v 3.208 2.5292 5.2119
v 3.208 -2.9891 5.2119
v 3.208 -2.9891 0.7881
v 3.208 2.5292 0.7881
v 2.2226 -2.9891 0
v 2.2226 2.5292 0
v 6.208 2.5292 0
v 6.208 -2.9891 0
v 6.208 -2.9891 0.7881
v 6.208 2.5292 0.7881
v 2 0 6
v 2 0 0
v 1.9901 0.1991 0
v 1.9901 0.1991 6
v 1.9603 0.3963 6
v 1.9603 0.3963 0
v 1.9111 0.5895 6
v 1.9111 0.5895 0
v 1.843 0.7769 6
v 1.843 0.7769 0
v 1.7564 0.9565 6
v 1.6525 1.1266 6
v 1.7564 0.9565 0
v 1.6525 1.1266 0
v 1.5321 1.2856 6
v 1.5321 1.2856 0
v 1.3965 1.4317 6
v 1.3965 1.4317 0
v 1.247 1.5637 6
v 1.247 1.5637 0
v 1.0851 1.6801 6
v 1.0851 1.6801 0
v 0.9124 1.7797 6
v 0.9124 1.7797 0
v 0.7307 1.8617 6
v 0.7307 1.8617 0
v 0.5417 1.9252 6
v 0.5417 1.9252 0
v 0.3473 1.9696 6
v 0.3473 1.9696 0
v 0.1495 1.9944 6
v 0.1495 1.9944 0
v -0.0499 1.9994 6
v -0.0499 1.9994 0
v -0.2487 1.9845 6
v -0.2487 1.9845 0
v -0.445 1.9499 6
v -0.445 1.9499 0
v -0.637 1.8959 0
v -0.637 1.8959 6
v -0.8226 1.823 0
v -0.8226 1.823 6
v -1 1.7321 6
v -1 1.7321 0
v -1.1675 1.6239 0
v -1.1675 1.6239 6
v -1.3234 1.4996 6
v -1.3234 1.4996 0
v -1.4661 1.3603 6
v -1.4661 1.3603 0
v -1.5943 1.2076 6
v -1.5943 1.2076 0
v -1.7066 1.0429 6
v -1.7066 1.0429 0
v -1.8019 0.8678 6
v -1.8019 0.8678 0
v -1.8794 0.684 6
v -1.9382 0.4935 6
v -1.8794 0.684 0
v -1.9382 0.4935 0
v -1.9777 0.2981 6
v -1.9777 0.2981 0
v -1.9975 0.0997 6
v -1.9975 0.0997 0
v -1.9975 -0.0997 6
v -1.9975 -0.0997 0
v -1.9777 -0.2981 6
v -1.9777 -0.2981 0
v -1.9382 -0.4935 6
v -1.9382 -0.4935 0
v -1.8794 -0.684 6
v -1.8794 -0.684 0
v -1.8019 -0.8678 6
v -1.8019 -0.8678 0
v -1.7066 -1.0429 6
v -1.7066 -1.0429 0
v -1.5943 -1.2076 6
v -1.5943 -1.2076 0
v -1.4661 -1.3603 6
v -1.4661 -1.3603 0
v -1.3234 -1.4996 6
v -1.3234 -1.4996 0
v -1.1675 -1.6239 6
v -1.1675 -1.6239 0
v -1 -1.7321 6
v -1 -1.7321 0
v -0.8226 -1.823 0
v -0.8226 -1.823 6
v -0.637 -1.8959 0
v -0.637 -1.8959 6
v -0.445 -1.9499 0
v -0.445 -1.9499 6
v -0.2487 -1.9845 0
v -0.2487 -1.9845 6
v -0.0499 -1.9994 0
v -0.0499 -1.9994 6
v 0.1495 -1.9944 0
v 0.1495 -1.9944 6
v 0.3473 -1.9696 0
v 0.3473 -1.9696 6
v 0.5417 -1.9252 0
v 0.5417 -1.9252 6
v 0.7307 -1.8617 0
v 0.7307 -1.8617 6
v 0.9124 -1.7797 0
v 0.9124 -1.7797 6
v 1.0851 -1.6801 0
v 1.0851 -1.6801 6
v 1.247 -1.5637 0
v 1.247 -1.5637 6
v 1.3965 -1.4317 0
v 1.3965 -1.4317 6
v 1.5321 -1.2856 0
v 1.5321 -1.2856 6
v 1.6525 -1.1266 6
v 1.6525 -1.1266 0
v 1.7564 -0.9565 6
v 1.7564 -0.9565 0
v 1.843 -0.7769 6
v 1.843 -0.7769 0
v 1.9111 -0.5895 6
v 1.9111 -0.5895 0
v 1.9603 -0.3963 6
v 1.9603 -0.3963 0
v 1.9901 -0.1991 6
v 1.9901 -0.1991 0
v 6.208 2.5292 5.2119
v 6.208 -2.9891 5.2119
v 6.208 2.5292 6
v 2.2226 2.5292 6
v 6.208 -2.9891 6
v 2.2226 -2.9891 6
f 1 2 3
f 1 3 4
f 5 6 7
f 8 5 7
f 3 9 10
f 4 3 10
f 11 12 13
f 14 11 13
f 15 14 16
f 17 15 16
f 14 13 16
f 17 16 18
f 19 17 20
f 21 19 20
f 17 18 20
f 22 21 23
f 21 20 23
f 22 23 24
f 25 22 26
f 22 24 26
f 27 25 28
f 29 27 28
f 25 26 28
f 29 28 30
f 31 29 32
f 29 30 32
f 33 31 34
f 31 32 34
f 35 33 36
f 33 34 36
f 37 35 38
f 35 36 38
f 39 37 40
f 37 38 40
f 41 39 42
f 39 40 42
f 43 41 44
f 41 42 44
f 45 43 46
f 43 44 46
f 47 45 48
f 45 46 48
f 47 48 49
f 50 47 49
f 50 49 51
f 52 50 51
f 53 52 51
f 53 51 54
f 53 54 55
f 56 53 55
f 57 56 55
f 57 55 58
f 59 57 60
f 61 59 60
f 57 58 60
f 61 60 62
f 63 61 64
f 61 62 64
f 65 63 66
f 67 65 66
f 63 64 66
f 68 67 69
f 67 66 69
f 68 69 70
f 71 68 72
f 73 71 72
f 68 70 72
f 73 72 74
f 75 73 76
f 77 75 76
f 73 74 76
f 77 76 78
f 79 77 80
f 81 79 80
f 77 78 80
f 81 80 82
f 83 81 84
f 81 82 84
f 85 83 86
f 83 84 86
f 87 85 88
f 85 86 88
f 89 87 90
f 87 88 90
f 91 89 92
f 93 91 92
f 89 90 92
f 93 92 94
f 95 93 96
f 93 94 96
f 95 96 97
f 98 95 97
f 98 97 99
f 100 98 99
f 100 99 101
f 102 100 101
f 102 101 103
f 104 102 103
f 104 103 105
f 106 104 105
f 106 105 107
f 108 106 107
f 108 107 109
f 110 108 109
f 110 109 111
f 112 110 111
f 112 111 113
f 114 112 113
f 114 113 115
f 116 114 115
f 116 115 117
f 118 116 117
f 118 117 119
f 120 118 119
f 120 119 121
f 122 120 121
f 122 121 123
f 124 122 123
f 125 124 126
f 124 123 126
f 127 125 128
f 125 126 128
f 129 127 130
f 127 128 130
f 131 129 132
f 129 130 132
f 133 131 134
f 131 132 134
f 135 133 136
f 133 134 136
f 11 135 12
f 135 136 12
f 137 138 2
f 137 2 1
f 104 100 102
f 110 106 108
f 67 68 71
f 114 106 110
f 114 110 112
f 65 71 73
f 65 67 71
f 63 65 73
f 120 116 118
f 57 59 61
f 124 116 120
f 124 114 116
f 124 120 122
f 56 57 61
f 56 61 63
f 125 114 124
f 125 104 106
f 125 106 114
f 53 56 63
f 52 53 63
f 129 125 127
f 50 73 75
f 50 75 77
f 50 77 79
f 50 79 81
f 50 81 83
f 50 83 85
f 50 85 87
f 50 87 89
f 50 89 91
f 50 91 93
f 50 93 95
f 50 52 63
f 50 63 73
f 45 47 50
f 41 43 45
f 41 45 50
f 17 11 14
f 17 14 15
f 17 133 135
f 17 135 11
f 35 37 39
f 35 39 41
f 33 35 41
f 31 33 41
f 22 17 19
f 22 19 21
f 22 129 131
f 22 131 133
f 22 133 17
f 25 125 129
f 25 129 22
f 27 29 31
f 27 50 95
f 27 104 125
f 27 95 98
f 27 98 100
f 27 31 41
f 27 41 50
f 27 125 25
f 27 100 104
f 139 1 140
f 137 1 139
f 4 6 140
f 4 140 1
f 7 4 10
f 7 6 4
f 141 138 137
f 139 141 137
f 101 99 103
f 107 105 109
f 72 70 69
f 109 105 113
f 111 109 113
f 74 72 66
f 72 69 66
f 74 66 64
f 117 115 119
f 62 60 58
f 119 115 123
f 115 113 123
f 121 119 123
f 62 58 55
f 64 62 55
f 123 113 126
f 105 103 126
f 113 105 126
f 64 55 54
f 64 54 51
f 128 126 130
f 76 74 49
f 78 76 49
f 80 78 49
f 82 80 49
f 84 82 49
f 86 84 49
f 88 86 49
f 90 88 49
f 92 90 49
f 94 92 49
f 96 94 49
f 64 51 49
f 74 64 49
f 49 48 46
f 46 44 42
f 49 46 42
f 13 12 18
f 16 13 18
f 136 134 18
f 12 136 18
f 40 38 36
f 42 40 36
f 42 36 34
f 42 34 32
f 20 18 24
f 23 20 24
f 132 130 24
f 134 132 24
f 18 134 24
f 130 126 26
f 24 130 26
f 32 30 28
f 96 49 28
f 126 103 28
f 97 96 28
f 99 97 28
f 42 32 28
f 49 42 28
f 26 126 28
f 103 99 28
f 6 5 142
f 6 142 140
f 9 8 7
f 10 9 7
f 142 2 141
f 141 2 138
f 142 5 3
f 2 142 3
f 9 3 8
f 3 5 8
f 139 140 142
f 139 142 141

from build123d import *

# Parameters (mm, degrees)
F0_W     = 3.9854018639
F0_H     = 5.5182484599
F1_DEPTH = 6
F0_R     = 2
F4_W     = 5.5182484599
F4_H     = 4.4237960246
F5_DEPTH = 3


# Not quite as in the source:
# - a feature of the source that left no trace in its solid (it failed there, or was rolled back) is left out


with BuildPart() as f1:
    # F0 (on Top) → F1 (new body)
    with BuildSketch(Plane.XY):
        with Locations((4.2153283333, -0.2299270127)):
            Rectangle(F0_W, F0_H)
    extrude(amount=F1_DEPTH)

    # F4 (on face) → F5 (cut)
    with BuildSketch(Plane.YZ.offset(6.2080292652)):
        with Locations((-0.2299270127, 3.0000001134)):
            Rectangle(F4_W, F4_H)
    extrude(amount=-F5_DEPTH, mode=Mode.SUBTRACT)


with BuildPart() as f1b:
    # F0 (on Top) → F1, piece 2 (new body)
    with BuildSketch(Plane.XY):
        Circle(F0_R)
    extrude(amount=F1_DEPTH)


solid = Compound([f1.part, f1b.part])
